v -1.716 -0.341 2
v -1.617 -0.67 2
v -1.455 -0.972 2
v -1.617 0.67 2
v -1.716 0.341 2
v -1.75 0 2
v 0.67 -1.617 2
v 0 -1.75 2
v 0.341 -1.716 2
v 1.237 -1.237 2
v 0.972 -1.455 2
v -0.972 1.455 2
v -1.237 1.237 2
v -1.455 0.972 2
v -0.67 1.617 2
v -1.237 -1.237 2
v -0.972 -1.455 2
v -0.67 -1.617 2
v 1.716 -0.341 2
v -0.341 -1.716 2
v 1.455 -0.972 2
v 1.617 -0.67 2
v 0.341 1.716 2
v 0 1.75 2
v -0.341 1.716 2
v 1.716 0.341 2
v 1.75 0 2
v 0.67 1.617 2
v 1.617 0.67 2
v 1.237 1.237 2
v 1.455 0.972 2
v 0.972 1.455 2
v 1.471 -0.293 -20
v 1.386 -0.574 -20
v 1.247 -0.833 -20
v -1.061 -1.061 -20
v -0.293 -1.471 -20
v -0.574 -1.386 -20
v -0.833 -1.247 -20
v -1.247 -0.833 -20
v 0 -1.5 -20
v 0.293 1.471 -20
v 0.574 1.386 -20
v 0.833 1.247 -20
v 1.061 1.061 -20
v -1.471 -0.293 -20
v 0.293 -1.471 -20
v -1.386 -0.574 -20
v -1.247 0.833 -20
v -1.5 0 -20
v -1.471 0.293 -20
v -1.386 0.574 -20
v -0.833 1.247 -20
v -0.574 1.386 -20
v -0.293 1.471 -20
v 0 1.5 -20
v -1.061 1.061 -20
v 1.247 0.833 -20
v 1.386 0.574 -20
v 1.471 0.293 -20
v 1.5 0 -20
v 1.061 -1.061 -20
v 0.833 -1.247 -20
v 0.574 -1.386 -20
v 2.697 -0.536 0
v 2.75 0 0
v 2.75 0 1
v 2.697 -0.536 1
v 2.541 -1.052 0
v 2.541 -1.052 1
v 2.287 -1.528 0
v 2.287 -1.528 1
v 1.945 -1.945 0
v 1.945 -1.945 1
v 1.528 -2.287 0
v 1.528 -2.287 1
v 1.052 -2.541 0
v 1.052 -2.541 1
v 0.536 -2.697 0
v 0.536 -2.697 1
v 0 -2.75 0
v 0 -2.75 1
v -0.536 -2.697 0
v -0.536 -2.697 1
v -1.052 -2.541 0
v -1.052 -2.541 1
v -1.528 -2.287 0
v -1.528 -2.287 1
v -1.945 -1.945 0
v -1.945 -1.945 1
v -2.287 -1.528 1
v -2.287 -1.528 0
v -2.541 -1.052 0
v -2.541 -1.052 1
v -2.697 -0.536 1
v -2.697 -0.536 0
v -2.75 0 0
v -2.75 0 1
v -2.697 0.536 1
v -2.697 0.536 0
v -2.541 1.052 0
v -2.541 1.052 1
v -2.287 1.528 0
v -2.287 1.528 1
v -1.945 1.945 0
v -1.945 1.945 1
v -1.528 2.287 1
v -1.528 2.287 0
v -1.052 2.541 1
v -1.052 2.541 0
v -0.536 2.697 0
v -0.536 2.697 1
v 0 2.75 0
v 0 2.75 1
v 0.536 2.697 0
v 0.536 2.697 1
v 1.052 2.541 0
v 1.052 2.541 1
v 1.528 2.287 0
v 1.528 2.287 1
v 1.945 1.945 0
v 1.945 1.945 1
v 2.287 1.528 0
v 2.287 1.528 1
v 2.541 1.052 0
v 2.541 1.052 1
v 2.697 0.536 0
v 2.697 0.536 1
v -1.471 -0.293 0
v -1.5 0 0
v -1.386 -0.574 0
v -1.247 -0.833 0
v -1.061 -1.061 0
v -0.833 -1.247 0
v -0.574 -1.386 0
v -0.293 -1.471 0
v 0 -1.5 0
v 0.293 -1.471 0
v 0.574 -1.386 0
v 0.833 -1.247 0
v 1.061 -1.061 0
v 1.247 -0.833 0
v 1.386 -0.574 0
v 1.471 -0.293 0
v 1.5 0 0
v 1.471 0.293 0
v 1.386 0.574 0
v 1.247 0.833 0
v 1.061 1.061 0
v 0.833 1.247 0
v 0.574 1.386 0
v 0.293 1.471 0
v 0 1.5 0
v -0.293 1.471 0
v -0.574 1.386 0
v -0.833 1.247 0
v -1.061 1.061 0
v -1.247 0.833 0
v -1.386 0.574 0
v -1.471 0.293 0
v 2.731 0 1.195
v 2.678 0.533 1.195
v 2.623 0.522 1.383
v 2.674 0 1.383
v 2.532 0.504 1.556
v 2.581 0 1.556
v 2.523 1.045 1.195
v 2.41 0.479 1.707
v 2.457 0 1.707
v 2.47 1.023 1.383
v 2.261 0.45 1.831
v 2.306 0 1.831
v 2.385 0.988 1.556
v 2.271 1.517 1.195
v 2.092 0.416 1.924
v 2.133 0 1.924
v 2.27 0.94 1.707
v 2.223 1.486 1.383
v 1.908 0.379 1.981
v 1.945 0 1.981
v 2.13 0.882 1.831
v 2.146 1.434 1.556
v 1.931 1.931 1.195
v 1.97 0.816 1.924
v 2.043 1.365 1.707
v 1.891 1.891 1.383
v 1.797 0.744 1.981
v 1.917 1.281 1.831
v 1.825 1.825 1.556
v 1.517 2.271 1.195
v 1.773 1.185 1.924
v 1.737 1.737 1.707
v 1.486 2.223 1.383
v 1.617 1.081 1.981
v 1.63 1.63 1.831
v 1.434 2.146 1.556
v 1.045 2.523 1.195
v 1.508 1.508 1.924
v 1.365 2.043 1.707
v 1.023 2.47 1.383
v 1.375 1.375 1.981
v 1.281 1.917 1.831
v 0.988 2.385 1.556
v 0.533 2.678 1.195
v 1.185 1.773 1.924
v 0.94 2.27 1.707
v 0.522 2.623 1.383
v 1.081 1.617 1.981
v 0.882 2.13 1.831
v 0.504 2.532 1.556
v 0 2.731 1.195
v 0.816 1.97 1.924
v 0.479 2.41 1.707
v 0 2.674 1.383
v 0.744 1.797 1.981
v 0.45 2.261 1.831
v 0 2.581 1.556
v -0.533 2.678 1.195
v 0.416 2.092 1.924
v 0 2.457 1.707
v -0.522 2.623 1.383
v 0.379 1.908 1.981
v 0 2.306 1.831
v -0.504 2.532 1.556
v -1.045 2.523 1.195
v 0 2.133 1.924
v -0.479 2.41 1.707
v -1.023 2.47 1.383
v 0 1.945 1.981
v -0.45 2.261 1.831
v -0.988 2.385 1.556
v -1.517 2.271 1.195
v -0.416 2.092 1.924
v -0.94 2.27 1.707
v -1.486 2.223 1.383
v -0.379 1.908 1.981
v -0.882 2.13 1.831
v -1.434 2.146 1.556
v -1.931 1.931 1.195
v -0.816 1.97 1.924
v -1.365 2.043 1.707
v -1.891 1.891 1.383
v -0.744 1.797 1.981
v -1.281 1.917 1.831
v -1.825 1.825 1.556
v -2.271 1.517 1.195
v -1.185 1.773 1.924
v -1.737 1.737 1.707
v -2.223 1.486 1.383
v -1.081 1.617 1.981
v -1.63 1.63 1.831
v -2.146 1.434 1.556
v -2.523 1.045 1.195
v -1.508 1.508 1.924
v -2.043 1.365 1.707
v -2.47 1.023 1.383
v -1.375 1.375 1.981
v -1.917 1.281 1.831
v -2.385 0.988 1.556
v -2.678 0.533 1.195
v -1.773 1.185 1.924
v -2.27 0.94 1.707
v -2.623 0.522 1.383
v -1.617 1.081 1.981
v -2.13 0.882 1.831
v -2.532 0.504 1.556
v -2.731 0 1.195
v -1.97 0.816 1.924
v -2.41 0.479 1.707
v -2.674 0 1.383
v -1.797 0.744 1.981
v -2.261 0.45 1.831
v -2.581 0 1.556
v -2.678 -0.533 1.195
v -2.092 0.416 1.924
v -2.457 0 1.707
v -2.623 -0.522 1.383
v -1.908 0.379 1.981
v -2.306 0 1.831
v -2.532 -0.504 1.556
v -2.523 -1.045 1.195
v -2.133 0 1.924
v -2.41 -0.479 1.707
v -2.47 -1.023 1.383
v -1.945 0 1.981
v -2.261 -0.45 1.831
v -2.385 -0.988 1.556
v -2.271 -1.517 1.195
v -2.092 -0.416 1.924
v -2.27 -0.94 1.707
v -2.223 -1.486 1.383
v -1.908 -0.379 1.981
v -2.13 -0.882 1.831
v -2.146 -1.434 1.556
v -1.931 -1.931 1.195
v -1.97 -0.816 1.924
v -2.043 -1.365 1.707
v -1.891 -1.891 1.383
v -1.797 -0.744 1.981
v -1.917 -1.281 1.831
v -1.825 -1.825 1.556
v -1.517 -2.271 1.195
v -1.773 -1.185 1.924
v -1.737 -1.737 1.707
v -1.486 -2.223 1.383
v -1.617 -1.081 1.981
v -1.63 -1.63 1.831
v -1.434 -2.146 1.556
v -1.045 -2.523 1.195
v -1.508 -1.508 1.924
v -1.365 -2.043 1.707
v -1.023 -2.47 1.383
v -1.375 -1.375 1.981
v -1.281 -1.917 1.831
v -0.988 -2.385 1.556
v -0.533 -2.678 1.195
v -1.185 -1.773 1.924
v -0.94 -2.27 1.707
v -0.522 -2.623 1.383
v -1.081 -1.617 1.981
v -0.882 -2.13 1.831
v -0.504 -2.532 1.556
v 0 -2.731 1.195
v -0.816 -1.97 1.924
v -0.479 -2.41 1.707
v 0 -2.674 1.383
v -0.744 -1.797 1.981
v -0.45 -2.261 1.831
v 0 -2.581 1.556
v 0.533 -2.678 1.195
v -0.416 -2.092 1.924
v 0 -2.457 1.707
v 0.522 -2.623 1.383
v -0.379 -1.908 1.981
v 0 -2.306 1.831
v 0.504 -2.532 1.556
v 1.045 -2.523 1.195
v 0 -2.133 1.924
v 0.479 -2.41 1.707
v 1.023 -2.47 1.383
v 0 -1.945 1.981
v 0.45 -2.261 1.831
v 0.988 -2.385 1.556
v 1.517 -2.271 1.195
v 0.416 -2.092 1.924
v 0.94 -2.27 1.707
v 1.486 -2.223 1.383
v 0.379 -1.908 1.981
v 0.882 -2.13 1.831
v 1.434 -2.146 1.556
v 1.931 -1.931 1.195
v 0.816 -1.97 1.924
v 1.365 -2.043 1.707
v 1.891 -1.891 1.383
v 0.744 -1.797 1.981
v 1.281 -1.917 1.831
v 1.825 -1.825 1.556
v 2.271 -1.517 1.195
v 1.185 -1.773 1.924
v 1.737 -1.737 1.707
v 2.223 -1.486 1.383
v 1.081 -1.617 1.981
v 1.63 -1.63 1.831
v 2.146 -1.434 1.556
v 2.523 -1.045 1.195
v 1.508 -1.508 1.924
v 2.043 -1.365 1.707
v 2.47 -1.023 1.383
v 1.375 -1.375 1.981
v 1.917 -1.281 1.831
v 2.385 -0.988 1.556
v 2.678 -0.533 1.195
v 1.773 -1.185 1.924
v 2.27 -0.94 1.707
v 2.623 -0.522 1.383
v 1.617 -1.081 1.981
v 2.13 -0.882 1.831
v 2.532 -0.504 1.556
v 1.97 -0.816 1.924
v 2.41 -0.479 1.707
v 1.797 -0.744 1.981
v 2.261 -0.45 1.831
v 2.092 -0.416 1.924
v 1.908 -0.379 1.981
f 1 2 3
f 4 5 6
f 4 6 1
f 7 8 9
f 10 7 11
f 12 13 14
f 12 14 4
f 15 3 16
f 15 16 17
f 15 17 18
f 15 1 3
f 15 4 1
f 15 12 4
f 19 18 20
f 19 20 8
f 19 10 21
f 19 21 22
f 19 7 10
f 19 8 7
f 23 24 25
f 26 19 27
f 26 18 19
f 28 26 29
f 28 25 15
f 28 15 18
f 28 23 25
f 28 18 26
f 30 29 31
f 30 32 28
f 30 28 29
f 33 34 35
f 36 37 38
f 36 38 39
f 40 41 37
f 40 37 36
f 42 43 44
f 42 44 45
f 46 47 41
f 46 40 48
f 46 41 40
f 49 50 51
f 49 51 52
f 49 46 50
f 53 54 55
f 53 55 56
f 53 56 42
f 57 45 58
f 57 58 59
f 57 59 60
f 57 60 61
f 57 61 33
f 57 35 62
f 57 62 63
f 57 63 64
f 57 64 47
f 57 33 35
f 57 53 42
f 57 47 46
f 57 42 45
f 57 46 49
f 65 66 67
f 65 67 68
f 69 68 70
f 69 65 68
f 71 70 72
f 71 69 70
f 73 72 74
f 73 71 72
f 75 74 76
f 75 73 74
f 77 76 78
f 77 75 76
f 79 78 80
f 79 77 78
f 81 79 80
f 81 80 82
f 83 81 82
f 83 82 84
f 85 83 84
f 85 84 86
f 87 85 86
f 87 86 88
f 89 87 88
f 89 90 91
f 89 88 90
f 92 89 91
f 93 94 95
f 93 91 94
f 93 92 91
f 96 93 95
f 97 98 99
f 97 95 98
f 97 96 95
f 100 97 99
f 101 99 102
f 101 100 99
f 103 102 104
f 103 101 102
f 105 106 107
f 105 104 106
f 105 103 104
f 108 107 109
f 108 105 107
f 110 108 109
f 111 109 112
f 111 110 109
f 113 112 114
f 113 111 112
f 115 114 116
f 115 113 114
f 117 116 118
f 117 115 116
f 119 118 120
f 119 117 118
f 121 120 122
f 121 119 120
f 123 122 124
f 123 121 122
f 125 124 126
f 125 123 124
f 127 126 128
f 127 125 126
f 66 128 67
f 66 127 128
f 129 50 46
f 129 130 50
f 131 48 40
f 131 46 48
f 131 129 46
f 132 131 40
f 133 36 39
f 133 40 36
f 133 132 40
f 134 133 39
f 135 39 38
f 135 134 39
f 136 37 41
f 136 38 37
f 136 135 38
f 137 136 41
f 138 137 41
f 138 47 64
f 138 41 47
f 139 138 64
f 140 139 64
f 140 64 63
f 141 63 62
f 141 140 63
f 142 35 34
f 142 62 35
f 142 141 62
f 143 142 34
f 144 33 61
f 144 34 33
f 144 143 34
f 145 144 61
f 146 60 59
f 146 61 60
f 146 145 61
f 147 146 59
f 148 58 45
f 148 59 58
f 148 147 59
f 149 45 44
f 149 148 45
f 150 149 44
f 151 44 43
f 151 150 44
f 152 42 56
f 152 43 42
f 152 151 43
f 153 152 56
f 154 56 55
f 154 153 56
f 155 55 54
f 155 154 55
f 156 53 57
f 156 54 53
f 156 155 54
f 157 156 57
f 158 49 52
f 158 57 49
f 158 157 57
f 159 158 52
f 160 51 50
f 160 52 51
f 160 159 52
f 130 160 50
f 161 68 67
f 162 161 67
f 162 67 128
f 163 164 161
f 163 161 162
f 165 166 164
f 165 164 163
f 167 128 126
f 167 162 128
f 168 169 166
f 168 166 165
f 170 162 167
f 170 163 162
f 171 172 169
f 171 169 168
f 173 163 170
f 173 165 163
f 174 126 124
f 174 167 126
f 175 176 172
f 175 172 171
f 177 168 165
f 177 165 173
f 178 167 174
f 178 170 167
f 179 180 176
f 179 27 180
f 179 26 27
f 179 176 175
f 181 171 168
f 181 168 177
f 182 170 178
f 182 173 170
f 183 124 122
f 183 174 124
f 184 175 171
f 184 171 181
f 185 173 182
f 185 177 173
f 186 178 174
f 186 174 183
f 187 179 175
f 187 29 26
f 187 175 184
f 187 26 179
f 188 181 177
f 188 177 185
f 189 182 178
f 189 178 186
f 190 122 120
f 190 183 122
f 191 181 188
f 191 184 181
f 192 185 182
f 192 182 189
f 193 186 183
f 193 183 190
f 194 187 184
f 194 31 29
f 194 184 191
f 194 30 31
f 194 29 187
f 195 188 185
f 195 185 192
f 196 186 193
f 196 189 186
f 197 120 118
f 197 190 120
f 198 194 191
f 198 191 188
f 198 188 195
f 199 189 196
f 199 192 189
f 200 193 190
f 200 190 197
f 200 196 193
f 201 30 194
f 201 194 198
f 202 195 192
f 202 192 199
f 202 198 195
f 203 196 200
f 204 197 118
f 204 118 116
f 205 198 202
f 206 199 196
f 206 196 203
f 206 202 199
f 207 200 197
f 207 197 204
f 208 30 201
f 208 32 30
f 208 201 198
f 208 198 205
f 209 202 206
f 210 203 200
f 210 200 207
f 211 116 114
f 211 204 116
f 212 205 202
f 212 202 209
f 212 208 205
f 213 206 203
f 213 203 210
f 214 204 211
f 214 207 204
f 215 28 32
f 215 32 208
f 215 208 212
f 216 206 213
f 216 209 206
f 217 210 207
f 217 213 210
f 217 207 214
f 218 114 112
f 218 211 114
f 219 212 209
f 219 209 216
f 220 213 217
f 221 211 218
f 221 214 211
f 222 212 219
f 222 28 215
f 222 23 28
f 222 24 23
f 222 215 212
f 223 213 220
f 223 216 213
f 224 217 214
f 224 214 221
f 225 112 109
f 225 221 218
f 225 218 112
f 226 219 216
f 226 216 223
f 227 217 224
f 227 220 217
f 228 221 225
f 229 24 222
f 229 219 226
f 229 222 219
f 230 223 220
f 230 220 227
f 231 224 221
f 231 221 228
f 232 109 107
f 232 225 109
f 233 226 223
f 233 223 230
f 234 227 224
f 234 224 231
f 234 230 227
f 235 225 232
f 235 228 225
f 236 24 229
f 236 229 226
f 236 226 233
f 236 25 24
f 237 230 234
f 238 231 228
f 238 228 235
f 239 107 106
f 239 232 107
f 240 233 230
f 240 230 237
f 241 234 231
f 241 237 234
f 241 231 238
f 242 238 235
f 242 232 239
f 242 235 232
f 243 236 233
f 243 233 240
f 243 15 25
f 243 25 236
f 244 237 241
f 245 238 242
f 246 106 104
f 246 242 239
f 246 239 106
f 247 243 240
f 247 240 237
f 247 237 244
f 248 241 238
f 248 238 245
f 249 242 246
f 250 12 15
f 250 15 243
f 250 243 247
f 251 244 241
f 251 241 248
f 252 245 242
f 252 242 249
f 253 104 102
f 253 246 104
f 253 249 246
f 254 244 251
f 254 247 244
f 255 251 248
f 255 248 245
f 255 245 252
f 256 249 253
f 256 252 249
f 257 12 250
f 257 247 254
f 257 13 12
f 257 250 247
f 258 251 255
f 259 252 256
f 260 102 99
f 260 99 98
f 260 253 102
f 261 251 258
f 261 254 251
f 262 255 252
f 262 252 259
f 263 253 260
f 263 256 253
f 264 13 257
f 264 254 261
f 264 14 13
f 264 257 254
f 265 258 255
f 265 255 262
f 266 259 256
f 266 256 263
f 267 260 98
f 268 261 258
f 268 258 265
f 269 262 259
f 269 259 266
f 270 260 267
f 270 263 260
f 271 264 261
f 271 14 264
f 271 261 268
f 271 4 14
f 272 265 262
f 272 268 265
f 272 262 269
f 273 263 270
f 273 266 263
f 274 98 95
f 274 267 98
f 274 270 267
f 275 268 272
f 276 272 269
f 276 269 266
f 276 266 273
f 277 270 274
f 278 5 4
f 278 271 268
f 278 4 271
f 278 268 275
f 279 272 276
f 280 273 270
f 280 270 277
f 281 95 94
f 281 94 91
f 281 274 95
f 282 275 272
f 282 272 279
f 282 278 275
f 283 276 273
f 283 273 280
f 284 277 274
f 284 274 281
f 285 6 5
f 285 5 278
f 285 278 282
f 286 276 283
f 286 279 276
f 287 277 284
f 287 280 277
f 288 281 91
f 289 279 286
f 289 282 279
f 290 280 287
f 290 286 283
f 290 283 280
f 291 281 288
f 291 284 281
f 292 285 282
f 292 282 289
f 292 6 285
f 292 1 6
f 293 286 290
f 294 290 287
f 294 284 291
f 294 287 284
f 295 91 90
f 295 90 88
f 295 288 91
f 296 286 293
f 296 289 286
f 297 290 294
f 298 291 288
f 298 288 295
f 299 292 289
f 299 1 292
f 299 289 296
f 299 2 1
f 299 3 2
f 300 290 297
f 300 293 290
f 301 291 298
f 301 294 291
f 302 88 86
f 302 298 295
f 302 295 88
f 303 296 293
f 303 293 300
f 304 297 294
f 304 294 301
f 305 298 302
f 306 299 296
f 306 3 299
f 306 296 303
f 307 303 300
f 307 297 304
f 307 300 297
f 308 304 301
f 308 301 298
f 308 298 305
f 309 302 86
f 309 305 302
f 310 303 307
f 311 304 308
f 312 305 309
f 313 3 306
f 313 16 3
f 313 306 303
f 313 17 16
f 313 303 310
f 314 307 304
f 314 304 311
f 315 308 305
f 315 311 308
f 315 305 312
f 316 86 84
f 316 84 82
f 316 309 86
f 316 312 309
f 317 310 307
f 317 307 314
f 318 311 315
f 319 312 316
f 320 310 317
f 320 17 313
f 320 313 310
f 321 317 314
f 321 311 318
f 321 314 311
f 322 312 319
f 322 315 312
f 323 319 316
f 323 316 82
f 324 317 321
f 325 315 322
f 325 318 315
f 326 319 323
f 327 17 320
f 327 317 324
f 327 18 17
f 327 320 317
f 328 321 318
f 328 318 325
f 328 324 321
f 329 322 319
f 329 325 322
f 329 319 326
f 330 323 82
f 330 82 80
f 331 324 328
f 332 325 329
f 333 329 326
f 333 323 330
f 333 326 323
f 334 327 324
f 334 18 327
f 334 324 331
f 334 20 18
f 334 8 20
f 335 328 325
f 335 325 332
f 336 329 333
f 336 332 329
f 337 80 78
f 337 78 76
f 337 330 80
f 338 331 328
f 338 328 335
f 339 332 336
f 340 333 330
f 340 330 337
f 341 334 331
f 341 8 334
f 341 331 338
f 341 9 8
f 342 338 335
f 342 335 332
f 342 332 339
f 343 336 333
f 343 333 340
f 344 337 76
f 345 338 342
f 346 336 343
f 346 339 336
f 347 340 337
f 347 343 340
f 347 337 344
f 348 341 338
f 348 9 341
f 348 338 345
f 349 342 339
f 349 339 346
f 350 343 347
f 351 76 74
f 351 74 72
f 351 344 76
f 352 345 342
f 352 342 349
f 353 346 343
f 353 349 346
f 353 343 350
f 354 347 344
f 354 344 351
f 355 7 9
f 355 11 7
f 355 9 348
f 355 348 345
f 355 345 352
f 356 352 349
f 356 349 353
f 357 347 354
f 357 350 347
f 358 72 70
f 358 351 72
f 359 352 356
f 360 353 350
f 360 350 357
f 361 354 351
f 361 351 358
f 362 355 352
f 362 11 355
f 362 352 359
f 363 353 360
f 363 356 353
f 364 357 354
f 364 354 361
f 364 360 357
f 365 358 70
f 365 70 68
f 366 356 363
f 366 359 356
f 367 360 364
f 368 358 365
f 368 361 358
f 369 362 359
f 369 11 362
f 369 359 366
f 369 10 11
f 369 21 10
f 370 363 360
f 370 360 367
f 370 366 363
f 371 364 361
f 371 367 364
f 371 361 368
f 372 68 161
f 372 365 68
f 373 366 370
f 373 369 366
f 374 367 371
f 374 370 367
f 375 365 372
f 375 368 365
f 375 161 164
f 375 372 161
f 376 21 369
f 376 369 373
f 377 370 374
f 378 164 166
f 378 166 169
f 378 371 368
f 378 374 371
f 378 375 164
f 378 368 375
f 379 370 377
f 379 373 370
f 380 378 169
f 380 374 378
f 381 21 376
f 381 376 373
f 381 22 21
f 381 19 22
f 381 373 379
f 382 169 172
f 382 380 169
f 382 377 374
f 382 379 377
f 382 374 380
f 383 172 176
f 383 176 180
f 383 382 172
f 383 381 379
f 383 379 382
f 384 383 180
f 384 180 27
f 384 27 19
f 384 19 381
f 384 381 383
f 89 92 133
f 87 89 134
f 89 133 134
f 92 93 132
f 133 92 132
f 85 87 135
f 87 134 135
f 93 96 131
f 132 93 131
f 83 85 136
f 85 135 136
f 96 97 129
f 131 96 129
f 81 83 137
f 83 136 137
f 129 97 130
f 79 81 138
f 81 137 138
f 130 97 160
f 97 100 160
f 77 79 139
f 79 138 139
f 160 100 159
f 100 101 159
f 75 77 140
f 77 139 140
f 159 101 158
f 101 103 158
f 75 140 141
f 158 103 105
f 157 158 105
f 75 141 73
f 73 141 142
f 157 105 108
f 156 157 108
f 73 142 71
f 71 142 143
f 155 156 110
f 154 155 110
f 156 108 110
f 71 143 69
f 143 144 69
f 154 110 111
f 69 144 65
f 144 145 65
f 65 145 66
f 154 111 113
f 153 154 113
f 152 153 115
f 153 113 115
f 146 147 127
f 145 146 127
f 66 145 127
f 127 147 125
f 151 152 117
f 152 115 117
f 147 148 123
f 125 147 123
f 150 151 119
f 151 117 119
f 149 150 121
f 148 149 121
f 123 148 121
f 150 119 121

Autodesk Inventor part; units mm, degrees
ref_plane "YZ Plane" through (0, 0, 0) normal (1, 0, 0) x (0, 1, 0)
ref_plane "XZ Plane" through (0, 0, 0) normal (0, 1, 0) x (-1, 0, 0)
ref_plane "XY Plane" through (0, 0, 0) normal (0, 0, 1) x (1, 0, 0)
sketch "スケッチ1" plane through (0, 0, 0) normal (0, 0, 1) x (1, 0, 0)
  circle A0 centre (0, 0) radius 2.75
  dimension "d0" = 5.5
extrude "押し出し1" add sketch "スケッチ1" along normal blind 2
fillet "フィレット1" radius 1 1 edges at (-2.75, 0, 2)
sketch "スケッチ2" plane through (0, 0, 0) normal (0, 0, -1) x (-1, 0, 0)
  circle A0 centre (0, 0) radius 1.5
  dimension "d4" = 3
extrude "押し出し2" add sketch "スケッチ2" along normal blind 20
thread "ねじ1" size "M3x0.5" class "6g" standard "ANSI Metric M Profile" full length
properties part number "Screw" material "真鍮"
